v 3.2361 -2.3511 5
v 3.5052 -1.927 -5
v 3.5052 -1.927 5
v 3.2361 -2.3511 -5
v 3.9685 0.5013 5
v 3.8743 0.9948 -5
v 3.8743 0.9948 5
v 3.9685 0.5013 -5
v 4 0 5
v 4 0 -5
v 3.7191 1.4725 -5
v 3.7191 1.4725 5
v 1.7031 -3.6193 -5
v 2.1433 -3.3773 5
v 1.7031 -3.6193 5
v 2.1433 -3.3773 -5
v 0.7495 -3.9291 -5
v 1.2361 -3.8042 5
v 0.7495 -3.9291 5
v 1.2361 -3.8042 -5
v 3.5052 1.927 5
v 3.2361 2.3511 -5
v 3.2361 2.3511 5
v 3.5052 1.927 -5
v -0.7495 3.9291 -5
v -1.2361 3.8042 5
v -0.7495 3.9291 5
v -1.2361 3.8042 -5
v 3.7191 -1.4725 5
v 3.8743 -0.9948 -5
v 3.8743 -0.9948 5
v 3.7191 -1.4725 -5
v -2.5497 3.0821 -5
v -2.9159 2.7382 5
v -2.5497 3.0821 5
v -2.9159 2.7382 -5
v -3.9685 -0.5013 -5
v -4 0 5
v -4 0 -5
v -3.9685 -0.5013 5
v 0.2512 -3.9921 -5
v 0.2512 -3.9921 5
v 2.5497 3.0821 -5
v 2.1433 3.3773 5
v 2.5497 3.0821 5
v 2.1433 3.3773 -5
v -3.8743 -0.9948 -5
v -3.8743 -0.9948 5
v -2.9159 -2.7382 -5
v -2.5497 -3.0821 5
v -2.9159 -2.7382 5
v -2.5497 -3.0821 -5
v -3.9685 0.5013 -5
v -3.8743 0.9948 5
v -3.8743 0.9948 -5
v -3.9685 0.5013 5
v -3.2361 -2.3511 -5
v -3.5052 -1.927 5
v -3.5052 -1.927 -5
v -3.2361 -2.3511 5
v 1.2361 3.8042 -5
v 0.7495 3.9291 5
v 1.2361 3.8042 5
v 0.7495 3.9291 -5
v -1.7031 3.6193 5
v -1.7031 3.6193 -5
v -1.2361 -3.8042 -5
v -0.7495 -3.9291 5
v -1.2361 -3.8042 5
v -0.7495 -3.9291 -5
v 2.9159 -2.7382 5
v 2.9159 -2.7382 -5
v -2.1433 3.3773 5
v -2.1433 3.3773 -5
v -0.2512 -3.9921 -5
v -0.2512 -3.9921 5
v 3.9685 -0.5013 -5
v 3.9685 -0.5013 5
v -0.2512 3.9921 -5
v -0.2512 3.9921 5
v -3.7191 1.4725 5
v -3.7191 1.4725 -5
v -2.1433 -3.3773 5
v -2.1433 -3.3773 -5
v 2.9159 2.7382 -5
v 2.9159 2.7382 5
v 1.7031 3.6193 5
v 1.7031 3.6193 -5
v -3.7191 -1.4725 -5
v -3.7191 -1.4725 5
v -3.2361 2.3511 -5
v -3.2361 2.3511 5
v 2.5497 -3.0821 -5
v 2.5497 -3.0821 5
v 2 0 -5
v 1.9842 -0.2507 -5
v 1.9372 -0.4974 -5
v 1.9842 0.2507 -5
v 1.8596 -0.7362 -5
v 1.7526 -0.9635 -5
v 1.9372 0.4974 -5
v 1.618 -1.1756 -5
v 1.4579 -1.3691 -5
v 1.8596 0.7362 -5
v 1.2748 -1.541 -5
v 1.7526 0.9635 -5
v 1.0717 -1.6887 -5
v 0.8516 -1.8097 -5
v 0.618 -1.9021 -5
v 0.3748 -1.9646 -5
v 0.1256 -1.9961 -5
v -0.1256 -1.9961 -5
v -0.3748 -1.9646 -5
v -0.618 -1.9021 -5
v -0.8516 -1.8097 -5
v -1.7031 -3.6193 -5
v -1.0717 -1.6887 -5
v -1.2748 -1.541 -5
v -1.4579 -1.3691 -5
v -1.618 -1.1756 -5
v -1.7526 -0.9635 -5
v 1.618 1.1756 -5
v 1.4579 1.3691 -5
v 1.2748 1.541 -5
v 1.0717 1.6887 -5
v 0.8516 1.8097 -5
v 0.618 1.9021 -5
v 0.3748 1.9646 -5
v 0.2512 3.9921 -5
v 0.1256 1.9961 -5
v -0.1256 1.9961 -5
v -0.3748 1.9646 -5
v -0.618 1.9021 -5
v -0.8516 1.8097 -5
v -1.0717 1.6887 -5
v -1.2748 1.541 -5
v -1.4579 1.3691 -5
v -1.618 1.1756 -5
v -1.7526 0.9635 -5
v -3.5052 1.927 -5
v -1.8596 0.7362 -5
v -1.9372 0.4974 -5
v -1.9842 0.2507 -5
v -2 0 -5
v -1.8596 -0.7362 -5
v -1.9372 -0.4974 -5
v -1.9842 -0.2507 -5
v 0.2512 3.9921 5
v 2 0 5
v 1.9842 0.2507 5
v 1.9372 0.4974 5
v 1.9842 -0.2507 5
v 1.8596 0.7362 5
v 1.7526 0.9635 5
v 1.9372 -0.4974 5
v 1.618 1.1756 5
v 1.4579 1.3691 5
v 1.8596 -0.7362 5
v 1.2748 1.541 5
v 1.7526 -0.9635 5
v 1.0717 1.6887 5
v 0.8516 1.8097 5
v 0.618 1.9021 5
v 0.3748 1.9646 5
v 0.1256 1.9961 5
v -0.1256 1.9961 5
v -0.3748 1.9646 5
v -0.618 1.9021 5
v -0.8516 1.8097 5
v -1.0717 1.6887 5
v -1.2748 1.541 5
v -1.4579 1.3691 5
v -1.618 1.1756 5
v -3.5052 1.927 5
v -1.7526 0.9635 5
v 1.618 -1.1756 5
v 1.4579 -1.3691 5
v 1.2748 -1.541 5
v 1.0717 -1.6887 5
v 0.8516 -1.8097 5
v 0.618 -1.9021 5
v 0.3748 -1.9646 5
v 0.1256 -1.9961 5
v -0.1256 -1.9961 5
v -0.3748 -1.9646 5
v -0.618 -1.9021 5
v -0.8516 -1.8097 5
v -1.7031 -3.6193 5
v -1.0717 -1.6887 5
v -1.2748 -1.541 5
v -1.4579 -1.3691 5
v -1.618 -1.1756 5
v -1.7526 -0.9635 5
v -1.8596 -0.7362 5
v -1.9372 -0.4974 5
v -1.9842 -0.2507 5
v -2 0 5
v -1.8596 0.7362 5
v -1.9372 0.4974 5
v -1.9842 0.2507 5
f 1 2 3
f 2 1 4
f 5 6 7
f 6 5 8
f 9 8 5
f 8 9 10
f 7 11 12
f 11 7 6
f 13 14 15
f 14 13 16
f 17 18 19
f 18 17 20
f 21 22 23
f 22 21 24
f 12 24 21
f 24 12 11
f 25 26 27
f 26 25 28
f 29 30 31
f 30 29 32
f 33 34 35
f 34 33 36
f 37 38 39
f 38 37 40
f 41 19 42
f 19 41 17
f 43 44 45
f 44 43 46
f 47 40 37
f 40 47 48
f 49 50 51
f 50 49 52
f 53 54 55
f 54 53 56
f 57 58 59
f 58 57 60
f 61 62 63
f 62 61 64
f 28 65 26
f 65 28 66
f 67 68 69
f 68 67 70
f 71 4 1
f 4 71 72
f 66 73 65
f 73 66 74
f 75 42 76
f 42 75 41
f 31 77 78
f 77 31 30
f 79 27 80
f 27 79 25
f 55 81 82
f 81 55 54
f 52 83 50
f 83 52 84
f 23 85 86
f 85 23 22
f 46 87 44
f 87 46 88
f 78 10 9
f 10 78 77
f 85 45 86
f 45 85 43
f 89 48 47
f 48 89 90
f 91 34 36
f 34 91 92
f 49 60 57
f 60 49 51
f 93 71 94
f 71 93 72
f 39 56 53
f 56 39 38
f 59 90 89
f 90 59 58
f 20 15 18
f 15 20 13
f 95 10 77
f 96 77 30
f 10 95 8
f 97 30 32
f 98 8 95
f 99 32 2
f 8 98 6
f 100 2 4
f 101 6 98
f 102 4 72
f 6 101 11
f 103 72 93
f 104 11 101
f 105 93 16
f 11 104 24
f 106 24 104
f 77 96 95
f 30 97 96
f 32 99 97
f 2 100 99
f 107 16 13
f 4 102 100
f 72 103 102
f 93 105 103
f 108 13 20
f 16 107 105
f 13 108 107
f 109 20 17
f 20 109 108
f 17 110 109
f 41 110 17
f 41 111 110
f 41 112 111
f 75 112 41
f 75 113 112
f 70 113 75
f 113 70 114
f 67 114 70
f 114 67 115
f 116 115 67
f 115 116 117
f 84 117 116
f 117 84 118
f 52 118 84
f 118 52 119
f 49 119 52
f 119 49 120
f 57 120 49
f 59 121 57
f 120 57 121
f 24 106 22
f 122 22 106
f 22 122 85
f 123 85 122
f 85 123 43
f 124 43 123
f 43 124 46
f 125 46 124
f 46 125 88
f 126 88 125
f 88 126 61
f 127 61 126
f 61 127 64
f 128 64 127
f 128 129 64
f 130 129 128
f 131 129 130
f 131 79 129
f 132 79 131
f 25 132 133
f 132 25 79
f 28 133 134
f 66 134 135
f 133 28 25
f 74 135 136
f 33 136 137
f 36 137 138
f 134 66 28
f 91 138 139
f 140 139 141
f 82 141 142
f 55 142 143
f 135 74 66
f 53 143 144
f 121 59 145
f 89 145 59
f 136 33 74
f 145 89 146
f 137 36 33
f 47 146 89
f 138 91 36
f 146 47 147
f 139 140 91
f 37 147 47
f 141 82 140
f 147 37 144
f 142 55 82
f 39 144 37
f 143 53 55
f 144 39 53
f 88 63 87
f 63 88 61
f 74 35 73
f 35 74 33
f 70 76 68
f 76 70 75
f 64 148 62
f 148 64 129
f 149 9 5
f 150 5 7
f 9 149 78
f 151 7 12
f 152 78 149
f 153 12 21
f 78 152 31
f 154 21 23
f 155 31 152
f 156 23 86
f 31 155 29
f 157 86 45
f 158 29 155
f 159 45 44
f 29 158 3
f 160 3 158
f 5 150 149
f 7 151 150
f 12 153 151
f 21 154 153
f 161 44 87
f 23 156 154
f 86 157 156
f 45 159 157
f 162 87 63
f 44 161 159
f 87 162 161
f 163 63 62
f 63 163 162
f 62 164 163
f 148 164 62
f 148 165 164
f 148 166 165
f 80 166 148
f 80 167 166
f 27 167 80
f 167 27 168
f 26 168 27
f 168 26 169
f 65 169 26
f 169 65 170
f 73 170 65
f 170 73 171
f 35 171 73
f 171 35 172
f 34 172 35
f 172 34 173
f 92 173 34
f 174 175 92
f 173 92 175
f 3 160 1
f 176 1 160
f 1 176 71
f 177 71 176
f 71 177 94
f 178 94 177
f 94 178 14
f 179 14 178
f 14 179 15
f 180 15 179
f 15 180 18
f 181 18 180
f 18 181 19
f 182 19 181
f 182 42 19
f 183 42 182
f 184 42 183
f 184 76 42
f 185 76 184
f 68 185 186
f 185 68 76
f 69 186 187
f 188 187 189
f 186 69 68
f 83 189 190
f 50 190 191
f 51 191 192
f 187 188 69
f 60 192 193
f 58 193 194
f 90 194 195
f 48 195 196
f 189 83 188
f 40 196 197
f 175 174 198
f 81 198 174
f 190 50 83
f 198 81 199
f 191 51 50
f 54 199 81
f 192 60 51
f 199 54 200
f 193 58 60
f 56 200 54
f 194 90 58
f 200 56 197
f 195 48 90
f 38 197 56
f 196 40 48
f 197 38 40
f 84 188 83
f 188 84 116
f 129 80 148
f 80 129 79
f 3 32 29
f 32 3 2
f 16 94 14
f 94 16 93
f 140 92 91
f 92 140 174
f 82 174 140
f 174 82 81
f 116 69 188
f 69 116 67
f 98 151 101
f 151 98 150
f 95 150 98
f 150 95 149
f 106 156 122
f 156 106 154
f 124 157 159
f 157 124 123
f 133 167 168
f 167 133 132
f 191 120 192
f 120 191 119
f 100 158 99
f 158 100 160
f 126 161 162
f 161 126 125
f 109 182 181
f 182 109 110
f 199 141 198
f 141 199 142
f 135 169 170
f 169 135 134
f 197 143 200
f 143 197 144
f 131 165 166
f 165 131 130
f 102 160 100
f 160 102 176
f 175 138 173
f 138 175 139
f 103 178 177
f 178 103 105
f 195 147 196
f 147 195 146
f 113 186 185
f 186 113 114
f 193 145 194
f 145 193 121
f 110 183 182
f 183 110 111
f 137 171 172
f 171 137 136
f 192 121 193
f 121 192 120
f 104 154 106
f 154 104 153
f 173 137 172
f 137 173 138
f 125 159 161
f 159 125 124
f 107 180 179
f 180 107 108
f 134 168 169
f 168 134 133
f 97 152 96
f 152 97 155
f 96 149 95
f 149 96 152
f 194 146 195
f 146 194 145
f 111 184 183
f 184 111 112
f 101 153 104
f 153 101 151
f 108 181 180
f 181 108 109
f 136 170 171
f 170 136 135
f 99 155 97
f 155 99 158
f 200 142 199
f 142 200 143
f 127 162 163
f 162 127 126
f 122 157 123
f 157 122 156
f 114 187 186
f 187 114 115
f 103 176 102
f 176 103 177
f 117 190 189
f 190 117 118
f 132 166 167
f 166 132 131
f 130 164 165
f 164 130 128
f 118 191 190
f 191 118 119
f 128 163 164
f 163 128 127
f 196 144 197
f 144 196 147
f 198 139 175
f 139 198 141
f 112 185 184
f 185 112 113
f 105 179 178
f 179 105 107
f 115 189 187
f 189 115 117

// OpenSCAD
$fn = 50;


difference() {
	union() {
		translate(v = [0, 0, -5.0000000000]) {
			cylinder(h = 10, r = 4.0000000000);
		}
	}
	union() {
		translate(v = [0, 0, -100.0000000000]) {
			cylinder(h = 200, r = 2.0000000000);
		}
	}
}
